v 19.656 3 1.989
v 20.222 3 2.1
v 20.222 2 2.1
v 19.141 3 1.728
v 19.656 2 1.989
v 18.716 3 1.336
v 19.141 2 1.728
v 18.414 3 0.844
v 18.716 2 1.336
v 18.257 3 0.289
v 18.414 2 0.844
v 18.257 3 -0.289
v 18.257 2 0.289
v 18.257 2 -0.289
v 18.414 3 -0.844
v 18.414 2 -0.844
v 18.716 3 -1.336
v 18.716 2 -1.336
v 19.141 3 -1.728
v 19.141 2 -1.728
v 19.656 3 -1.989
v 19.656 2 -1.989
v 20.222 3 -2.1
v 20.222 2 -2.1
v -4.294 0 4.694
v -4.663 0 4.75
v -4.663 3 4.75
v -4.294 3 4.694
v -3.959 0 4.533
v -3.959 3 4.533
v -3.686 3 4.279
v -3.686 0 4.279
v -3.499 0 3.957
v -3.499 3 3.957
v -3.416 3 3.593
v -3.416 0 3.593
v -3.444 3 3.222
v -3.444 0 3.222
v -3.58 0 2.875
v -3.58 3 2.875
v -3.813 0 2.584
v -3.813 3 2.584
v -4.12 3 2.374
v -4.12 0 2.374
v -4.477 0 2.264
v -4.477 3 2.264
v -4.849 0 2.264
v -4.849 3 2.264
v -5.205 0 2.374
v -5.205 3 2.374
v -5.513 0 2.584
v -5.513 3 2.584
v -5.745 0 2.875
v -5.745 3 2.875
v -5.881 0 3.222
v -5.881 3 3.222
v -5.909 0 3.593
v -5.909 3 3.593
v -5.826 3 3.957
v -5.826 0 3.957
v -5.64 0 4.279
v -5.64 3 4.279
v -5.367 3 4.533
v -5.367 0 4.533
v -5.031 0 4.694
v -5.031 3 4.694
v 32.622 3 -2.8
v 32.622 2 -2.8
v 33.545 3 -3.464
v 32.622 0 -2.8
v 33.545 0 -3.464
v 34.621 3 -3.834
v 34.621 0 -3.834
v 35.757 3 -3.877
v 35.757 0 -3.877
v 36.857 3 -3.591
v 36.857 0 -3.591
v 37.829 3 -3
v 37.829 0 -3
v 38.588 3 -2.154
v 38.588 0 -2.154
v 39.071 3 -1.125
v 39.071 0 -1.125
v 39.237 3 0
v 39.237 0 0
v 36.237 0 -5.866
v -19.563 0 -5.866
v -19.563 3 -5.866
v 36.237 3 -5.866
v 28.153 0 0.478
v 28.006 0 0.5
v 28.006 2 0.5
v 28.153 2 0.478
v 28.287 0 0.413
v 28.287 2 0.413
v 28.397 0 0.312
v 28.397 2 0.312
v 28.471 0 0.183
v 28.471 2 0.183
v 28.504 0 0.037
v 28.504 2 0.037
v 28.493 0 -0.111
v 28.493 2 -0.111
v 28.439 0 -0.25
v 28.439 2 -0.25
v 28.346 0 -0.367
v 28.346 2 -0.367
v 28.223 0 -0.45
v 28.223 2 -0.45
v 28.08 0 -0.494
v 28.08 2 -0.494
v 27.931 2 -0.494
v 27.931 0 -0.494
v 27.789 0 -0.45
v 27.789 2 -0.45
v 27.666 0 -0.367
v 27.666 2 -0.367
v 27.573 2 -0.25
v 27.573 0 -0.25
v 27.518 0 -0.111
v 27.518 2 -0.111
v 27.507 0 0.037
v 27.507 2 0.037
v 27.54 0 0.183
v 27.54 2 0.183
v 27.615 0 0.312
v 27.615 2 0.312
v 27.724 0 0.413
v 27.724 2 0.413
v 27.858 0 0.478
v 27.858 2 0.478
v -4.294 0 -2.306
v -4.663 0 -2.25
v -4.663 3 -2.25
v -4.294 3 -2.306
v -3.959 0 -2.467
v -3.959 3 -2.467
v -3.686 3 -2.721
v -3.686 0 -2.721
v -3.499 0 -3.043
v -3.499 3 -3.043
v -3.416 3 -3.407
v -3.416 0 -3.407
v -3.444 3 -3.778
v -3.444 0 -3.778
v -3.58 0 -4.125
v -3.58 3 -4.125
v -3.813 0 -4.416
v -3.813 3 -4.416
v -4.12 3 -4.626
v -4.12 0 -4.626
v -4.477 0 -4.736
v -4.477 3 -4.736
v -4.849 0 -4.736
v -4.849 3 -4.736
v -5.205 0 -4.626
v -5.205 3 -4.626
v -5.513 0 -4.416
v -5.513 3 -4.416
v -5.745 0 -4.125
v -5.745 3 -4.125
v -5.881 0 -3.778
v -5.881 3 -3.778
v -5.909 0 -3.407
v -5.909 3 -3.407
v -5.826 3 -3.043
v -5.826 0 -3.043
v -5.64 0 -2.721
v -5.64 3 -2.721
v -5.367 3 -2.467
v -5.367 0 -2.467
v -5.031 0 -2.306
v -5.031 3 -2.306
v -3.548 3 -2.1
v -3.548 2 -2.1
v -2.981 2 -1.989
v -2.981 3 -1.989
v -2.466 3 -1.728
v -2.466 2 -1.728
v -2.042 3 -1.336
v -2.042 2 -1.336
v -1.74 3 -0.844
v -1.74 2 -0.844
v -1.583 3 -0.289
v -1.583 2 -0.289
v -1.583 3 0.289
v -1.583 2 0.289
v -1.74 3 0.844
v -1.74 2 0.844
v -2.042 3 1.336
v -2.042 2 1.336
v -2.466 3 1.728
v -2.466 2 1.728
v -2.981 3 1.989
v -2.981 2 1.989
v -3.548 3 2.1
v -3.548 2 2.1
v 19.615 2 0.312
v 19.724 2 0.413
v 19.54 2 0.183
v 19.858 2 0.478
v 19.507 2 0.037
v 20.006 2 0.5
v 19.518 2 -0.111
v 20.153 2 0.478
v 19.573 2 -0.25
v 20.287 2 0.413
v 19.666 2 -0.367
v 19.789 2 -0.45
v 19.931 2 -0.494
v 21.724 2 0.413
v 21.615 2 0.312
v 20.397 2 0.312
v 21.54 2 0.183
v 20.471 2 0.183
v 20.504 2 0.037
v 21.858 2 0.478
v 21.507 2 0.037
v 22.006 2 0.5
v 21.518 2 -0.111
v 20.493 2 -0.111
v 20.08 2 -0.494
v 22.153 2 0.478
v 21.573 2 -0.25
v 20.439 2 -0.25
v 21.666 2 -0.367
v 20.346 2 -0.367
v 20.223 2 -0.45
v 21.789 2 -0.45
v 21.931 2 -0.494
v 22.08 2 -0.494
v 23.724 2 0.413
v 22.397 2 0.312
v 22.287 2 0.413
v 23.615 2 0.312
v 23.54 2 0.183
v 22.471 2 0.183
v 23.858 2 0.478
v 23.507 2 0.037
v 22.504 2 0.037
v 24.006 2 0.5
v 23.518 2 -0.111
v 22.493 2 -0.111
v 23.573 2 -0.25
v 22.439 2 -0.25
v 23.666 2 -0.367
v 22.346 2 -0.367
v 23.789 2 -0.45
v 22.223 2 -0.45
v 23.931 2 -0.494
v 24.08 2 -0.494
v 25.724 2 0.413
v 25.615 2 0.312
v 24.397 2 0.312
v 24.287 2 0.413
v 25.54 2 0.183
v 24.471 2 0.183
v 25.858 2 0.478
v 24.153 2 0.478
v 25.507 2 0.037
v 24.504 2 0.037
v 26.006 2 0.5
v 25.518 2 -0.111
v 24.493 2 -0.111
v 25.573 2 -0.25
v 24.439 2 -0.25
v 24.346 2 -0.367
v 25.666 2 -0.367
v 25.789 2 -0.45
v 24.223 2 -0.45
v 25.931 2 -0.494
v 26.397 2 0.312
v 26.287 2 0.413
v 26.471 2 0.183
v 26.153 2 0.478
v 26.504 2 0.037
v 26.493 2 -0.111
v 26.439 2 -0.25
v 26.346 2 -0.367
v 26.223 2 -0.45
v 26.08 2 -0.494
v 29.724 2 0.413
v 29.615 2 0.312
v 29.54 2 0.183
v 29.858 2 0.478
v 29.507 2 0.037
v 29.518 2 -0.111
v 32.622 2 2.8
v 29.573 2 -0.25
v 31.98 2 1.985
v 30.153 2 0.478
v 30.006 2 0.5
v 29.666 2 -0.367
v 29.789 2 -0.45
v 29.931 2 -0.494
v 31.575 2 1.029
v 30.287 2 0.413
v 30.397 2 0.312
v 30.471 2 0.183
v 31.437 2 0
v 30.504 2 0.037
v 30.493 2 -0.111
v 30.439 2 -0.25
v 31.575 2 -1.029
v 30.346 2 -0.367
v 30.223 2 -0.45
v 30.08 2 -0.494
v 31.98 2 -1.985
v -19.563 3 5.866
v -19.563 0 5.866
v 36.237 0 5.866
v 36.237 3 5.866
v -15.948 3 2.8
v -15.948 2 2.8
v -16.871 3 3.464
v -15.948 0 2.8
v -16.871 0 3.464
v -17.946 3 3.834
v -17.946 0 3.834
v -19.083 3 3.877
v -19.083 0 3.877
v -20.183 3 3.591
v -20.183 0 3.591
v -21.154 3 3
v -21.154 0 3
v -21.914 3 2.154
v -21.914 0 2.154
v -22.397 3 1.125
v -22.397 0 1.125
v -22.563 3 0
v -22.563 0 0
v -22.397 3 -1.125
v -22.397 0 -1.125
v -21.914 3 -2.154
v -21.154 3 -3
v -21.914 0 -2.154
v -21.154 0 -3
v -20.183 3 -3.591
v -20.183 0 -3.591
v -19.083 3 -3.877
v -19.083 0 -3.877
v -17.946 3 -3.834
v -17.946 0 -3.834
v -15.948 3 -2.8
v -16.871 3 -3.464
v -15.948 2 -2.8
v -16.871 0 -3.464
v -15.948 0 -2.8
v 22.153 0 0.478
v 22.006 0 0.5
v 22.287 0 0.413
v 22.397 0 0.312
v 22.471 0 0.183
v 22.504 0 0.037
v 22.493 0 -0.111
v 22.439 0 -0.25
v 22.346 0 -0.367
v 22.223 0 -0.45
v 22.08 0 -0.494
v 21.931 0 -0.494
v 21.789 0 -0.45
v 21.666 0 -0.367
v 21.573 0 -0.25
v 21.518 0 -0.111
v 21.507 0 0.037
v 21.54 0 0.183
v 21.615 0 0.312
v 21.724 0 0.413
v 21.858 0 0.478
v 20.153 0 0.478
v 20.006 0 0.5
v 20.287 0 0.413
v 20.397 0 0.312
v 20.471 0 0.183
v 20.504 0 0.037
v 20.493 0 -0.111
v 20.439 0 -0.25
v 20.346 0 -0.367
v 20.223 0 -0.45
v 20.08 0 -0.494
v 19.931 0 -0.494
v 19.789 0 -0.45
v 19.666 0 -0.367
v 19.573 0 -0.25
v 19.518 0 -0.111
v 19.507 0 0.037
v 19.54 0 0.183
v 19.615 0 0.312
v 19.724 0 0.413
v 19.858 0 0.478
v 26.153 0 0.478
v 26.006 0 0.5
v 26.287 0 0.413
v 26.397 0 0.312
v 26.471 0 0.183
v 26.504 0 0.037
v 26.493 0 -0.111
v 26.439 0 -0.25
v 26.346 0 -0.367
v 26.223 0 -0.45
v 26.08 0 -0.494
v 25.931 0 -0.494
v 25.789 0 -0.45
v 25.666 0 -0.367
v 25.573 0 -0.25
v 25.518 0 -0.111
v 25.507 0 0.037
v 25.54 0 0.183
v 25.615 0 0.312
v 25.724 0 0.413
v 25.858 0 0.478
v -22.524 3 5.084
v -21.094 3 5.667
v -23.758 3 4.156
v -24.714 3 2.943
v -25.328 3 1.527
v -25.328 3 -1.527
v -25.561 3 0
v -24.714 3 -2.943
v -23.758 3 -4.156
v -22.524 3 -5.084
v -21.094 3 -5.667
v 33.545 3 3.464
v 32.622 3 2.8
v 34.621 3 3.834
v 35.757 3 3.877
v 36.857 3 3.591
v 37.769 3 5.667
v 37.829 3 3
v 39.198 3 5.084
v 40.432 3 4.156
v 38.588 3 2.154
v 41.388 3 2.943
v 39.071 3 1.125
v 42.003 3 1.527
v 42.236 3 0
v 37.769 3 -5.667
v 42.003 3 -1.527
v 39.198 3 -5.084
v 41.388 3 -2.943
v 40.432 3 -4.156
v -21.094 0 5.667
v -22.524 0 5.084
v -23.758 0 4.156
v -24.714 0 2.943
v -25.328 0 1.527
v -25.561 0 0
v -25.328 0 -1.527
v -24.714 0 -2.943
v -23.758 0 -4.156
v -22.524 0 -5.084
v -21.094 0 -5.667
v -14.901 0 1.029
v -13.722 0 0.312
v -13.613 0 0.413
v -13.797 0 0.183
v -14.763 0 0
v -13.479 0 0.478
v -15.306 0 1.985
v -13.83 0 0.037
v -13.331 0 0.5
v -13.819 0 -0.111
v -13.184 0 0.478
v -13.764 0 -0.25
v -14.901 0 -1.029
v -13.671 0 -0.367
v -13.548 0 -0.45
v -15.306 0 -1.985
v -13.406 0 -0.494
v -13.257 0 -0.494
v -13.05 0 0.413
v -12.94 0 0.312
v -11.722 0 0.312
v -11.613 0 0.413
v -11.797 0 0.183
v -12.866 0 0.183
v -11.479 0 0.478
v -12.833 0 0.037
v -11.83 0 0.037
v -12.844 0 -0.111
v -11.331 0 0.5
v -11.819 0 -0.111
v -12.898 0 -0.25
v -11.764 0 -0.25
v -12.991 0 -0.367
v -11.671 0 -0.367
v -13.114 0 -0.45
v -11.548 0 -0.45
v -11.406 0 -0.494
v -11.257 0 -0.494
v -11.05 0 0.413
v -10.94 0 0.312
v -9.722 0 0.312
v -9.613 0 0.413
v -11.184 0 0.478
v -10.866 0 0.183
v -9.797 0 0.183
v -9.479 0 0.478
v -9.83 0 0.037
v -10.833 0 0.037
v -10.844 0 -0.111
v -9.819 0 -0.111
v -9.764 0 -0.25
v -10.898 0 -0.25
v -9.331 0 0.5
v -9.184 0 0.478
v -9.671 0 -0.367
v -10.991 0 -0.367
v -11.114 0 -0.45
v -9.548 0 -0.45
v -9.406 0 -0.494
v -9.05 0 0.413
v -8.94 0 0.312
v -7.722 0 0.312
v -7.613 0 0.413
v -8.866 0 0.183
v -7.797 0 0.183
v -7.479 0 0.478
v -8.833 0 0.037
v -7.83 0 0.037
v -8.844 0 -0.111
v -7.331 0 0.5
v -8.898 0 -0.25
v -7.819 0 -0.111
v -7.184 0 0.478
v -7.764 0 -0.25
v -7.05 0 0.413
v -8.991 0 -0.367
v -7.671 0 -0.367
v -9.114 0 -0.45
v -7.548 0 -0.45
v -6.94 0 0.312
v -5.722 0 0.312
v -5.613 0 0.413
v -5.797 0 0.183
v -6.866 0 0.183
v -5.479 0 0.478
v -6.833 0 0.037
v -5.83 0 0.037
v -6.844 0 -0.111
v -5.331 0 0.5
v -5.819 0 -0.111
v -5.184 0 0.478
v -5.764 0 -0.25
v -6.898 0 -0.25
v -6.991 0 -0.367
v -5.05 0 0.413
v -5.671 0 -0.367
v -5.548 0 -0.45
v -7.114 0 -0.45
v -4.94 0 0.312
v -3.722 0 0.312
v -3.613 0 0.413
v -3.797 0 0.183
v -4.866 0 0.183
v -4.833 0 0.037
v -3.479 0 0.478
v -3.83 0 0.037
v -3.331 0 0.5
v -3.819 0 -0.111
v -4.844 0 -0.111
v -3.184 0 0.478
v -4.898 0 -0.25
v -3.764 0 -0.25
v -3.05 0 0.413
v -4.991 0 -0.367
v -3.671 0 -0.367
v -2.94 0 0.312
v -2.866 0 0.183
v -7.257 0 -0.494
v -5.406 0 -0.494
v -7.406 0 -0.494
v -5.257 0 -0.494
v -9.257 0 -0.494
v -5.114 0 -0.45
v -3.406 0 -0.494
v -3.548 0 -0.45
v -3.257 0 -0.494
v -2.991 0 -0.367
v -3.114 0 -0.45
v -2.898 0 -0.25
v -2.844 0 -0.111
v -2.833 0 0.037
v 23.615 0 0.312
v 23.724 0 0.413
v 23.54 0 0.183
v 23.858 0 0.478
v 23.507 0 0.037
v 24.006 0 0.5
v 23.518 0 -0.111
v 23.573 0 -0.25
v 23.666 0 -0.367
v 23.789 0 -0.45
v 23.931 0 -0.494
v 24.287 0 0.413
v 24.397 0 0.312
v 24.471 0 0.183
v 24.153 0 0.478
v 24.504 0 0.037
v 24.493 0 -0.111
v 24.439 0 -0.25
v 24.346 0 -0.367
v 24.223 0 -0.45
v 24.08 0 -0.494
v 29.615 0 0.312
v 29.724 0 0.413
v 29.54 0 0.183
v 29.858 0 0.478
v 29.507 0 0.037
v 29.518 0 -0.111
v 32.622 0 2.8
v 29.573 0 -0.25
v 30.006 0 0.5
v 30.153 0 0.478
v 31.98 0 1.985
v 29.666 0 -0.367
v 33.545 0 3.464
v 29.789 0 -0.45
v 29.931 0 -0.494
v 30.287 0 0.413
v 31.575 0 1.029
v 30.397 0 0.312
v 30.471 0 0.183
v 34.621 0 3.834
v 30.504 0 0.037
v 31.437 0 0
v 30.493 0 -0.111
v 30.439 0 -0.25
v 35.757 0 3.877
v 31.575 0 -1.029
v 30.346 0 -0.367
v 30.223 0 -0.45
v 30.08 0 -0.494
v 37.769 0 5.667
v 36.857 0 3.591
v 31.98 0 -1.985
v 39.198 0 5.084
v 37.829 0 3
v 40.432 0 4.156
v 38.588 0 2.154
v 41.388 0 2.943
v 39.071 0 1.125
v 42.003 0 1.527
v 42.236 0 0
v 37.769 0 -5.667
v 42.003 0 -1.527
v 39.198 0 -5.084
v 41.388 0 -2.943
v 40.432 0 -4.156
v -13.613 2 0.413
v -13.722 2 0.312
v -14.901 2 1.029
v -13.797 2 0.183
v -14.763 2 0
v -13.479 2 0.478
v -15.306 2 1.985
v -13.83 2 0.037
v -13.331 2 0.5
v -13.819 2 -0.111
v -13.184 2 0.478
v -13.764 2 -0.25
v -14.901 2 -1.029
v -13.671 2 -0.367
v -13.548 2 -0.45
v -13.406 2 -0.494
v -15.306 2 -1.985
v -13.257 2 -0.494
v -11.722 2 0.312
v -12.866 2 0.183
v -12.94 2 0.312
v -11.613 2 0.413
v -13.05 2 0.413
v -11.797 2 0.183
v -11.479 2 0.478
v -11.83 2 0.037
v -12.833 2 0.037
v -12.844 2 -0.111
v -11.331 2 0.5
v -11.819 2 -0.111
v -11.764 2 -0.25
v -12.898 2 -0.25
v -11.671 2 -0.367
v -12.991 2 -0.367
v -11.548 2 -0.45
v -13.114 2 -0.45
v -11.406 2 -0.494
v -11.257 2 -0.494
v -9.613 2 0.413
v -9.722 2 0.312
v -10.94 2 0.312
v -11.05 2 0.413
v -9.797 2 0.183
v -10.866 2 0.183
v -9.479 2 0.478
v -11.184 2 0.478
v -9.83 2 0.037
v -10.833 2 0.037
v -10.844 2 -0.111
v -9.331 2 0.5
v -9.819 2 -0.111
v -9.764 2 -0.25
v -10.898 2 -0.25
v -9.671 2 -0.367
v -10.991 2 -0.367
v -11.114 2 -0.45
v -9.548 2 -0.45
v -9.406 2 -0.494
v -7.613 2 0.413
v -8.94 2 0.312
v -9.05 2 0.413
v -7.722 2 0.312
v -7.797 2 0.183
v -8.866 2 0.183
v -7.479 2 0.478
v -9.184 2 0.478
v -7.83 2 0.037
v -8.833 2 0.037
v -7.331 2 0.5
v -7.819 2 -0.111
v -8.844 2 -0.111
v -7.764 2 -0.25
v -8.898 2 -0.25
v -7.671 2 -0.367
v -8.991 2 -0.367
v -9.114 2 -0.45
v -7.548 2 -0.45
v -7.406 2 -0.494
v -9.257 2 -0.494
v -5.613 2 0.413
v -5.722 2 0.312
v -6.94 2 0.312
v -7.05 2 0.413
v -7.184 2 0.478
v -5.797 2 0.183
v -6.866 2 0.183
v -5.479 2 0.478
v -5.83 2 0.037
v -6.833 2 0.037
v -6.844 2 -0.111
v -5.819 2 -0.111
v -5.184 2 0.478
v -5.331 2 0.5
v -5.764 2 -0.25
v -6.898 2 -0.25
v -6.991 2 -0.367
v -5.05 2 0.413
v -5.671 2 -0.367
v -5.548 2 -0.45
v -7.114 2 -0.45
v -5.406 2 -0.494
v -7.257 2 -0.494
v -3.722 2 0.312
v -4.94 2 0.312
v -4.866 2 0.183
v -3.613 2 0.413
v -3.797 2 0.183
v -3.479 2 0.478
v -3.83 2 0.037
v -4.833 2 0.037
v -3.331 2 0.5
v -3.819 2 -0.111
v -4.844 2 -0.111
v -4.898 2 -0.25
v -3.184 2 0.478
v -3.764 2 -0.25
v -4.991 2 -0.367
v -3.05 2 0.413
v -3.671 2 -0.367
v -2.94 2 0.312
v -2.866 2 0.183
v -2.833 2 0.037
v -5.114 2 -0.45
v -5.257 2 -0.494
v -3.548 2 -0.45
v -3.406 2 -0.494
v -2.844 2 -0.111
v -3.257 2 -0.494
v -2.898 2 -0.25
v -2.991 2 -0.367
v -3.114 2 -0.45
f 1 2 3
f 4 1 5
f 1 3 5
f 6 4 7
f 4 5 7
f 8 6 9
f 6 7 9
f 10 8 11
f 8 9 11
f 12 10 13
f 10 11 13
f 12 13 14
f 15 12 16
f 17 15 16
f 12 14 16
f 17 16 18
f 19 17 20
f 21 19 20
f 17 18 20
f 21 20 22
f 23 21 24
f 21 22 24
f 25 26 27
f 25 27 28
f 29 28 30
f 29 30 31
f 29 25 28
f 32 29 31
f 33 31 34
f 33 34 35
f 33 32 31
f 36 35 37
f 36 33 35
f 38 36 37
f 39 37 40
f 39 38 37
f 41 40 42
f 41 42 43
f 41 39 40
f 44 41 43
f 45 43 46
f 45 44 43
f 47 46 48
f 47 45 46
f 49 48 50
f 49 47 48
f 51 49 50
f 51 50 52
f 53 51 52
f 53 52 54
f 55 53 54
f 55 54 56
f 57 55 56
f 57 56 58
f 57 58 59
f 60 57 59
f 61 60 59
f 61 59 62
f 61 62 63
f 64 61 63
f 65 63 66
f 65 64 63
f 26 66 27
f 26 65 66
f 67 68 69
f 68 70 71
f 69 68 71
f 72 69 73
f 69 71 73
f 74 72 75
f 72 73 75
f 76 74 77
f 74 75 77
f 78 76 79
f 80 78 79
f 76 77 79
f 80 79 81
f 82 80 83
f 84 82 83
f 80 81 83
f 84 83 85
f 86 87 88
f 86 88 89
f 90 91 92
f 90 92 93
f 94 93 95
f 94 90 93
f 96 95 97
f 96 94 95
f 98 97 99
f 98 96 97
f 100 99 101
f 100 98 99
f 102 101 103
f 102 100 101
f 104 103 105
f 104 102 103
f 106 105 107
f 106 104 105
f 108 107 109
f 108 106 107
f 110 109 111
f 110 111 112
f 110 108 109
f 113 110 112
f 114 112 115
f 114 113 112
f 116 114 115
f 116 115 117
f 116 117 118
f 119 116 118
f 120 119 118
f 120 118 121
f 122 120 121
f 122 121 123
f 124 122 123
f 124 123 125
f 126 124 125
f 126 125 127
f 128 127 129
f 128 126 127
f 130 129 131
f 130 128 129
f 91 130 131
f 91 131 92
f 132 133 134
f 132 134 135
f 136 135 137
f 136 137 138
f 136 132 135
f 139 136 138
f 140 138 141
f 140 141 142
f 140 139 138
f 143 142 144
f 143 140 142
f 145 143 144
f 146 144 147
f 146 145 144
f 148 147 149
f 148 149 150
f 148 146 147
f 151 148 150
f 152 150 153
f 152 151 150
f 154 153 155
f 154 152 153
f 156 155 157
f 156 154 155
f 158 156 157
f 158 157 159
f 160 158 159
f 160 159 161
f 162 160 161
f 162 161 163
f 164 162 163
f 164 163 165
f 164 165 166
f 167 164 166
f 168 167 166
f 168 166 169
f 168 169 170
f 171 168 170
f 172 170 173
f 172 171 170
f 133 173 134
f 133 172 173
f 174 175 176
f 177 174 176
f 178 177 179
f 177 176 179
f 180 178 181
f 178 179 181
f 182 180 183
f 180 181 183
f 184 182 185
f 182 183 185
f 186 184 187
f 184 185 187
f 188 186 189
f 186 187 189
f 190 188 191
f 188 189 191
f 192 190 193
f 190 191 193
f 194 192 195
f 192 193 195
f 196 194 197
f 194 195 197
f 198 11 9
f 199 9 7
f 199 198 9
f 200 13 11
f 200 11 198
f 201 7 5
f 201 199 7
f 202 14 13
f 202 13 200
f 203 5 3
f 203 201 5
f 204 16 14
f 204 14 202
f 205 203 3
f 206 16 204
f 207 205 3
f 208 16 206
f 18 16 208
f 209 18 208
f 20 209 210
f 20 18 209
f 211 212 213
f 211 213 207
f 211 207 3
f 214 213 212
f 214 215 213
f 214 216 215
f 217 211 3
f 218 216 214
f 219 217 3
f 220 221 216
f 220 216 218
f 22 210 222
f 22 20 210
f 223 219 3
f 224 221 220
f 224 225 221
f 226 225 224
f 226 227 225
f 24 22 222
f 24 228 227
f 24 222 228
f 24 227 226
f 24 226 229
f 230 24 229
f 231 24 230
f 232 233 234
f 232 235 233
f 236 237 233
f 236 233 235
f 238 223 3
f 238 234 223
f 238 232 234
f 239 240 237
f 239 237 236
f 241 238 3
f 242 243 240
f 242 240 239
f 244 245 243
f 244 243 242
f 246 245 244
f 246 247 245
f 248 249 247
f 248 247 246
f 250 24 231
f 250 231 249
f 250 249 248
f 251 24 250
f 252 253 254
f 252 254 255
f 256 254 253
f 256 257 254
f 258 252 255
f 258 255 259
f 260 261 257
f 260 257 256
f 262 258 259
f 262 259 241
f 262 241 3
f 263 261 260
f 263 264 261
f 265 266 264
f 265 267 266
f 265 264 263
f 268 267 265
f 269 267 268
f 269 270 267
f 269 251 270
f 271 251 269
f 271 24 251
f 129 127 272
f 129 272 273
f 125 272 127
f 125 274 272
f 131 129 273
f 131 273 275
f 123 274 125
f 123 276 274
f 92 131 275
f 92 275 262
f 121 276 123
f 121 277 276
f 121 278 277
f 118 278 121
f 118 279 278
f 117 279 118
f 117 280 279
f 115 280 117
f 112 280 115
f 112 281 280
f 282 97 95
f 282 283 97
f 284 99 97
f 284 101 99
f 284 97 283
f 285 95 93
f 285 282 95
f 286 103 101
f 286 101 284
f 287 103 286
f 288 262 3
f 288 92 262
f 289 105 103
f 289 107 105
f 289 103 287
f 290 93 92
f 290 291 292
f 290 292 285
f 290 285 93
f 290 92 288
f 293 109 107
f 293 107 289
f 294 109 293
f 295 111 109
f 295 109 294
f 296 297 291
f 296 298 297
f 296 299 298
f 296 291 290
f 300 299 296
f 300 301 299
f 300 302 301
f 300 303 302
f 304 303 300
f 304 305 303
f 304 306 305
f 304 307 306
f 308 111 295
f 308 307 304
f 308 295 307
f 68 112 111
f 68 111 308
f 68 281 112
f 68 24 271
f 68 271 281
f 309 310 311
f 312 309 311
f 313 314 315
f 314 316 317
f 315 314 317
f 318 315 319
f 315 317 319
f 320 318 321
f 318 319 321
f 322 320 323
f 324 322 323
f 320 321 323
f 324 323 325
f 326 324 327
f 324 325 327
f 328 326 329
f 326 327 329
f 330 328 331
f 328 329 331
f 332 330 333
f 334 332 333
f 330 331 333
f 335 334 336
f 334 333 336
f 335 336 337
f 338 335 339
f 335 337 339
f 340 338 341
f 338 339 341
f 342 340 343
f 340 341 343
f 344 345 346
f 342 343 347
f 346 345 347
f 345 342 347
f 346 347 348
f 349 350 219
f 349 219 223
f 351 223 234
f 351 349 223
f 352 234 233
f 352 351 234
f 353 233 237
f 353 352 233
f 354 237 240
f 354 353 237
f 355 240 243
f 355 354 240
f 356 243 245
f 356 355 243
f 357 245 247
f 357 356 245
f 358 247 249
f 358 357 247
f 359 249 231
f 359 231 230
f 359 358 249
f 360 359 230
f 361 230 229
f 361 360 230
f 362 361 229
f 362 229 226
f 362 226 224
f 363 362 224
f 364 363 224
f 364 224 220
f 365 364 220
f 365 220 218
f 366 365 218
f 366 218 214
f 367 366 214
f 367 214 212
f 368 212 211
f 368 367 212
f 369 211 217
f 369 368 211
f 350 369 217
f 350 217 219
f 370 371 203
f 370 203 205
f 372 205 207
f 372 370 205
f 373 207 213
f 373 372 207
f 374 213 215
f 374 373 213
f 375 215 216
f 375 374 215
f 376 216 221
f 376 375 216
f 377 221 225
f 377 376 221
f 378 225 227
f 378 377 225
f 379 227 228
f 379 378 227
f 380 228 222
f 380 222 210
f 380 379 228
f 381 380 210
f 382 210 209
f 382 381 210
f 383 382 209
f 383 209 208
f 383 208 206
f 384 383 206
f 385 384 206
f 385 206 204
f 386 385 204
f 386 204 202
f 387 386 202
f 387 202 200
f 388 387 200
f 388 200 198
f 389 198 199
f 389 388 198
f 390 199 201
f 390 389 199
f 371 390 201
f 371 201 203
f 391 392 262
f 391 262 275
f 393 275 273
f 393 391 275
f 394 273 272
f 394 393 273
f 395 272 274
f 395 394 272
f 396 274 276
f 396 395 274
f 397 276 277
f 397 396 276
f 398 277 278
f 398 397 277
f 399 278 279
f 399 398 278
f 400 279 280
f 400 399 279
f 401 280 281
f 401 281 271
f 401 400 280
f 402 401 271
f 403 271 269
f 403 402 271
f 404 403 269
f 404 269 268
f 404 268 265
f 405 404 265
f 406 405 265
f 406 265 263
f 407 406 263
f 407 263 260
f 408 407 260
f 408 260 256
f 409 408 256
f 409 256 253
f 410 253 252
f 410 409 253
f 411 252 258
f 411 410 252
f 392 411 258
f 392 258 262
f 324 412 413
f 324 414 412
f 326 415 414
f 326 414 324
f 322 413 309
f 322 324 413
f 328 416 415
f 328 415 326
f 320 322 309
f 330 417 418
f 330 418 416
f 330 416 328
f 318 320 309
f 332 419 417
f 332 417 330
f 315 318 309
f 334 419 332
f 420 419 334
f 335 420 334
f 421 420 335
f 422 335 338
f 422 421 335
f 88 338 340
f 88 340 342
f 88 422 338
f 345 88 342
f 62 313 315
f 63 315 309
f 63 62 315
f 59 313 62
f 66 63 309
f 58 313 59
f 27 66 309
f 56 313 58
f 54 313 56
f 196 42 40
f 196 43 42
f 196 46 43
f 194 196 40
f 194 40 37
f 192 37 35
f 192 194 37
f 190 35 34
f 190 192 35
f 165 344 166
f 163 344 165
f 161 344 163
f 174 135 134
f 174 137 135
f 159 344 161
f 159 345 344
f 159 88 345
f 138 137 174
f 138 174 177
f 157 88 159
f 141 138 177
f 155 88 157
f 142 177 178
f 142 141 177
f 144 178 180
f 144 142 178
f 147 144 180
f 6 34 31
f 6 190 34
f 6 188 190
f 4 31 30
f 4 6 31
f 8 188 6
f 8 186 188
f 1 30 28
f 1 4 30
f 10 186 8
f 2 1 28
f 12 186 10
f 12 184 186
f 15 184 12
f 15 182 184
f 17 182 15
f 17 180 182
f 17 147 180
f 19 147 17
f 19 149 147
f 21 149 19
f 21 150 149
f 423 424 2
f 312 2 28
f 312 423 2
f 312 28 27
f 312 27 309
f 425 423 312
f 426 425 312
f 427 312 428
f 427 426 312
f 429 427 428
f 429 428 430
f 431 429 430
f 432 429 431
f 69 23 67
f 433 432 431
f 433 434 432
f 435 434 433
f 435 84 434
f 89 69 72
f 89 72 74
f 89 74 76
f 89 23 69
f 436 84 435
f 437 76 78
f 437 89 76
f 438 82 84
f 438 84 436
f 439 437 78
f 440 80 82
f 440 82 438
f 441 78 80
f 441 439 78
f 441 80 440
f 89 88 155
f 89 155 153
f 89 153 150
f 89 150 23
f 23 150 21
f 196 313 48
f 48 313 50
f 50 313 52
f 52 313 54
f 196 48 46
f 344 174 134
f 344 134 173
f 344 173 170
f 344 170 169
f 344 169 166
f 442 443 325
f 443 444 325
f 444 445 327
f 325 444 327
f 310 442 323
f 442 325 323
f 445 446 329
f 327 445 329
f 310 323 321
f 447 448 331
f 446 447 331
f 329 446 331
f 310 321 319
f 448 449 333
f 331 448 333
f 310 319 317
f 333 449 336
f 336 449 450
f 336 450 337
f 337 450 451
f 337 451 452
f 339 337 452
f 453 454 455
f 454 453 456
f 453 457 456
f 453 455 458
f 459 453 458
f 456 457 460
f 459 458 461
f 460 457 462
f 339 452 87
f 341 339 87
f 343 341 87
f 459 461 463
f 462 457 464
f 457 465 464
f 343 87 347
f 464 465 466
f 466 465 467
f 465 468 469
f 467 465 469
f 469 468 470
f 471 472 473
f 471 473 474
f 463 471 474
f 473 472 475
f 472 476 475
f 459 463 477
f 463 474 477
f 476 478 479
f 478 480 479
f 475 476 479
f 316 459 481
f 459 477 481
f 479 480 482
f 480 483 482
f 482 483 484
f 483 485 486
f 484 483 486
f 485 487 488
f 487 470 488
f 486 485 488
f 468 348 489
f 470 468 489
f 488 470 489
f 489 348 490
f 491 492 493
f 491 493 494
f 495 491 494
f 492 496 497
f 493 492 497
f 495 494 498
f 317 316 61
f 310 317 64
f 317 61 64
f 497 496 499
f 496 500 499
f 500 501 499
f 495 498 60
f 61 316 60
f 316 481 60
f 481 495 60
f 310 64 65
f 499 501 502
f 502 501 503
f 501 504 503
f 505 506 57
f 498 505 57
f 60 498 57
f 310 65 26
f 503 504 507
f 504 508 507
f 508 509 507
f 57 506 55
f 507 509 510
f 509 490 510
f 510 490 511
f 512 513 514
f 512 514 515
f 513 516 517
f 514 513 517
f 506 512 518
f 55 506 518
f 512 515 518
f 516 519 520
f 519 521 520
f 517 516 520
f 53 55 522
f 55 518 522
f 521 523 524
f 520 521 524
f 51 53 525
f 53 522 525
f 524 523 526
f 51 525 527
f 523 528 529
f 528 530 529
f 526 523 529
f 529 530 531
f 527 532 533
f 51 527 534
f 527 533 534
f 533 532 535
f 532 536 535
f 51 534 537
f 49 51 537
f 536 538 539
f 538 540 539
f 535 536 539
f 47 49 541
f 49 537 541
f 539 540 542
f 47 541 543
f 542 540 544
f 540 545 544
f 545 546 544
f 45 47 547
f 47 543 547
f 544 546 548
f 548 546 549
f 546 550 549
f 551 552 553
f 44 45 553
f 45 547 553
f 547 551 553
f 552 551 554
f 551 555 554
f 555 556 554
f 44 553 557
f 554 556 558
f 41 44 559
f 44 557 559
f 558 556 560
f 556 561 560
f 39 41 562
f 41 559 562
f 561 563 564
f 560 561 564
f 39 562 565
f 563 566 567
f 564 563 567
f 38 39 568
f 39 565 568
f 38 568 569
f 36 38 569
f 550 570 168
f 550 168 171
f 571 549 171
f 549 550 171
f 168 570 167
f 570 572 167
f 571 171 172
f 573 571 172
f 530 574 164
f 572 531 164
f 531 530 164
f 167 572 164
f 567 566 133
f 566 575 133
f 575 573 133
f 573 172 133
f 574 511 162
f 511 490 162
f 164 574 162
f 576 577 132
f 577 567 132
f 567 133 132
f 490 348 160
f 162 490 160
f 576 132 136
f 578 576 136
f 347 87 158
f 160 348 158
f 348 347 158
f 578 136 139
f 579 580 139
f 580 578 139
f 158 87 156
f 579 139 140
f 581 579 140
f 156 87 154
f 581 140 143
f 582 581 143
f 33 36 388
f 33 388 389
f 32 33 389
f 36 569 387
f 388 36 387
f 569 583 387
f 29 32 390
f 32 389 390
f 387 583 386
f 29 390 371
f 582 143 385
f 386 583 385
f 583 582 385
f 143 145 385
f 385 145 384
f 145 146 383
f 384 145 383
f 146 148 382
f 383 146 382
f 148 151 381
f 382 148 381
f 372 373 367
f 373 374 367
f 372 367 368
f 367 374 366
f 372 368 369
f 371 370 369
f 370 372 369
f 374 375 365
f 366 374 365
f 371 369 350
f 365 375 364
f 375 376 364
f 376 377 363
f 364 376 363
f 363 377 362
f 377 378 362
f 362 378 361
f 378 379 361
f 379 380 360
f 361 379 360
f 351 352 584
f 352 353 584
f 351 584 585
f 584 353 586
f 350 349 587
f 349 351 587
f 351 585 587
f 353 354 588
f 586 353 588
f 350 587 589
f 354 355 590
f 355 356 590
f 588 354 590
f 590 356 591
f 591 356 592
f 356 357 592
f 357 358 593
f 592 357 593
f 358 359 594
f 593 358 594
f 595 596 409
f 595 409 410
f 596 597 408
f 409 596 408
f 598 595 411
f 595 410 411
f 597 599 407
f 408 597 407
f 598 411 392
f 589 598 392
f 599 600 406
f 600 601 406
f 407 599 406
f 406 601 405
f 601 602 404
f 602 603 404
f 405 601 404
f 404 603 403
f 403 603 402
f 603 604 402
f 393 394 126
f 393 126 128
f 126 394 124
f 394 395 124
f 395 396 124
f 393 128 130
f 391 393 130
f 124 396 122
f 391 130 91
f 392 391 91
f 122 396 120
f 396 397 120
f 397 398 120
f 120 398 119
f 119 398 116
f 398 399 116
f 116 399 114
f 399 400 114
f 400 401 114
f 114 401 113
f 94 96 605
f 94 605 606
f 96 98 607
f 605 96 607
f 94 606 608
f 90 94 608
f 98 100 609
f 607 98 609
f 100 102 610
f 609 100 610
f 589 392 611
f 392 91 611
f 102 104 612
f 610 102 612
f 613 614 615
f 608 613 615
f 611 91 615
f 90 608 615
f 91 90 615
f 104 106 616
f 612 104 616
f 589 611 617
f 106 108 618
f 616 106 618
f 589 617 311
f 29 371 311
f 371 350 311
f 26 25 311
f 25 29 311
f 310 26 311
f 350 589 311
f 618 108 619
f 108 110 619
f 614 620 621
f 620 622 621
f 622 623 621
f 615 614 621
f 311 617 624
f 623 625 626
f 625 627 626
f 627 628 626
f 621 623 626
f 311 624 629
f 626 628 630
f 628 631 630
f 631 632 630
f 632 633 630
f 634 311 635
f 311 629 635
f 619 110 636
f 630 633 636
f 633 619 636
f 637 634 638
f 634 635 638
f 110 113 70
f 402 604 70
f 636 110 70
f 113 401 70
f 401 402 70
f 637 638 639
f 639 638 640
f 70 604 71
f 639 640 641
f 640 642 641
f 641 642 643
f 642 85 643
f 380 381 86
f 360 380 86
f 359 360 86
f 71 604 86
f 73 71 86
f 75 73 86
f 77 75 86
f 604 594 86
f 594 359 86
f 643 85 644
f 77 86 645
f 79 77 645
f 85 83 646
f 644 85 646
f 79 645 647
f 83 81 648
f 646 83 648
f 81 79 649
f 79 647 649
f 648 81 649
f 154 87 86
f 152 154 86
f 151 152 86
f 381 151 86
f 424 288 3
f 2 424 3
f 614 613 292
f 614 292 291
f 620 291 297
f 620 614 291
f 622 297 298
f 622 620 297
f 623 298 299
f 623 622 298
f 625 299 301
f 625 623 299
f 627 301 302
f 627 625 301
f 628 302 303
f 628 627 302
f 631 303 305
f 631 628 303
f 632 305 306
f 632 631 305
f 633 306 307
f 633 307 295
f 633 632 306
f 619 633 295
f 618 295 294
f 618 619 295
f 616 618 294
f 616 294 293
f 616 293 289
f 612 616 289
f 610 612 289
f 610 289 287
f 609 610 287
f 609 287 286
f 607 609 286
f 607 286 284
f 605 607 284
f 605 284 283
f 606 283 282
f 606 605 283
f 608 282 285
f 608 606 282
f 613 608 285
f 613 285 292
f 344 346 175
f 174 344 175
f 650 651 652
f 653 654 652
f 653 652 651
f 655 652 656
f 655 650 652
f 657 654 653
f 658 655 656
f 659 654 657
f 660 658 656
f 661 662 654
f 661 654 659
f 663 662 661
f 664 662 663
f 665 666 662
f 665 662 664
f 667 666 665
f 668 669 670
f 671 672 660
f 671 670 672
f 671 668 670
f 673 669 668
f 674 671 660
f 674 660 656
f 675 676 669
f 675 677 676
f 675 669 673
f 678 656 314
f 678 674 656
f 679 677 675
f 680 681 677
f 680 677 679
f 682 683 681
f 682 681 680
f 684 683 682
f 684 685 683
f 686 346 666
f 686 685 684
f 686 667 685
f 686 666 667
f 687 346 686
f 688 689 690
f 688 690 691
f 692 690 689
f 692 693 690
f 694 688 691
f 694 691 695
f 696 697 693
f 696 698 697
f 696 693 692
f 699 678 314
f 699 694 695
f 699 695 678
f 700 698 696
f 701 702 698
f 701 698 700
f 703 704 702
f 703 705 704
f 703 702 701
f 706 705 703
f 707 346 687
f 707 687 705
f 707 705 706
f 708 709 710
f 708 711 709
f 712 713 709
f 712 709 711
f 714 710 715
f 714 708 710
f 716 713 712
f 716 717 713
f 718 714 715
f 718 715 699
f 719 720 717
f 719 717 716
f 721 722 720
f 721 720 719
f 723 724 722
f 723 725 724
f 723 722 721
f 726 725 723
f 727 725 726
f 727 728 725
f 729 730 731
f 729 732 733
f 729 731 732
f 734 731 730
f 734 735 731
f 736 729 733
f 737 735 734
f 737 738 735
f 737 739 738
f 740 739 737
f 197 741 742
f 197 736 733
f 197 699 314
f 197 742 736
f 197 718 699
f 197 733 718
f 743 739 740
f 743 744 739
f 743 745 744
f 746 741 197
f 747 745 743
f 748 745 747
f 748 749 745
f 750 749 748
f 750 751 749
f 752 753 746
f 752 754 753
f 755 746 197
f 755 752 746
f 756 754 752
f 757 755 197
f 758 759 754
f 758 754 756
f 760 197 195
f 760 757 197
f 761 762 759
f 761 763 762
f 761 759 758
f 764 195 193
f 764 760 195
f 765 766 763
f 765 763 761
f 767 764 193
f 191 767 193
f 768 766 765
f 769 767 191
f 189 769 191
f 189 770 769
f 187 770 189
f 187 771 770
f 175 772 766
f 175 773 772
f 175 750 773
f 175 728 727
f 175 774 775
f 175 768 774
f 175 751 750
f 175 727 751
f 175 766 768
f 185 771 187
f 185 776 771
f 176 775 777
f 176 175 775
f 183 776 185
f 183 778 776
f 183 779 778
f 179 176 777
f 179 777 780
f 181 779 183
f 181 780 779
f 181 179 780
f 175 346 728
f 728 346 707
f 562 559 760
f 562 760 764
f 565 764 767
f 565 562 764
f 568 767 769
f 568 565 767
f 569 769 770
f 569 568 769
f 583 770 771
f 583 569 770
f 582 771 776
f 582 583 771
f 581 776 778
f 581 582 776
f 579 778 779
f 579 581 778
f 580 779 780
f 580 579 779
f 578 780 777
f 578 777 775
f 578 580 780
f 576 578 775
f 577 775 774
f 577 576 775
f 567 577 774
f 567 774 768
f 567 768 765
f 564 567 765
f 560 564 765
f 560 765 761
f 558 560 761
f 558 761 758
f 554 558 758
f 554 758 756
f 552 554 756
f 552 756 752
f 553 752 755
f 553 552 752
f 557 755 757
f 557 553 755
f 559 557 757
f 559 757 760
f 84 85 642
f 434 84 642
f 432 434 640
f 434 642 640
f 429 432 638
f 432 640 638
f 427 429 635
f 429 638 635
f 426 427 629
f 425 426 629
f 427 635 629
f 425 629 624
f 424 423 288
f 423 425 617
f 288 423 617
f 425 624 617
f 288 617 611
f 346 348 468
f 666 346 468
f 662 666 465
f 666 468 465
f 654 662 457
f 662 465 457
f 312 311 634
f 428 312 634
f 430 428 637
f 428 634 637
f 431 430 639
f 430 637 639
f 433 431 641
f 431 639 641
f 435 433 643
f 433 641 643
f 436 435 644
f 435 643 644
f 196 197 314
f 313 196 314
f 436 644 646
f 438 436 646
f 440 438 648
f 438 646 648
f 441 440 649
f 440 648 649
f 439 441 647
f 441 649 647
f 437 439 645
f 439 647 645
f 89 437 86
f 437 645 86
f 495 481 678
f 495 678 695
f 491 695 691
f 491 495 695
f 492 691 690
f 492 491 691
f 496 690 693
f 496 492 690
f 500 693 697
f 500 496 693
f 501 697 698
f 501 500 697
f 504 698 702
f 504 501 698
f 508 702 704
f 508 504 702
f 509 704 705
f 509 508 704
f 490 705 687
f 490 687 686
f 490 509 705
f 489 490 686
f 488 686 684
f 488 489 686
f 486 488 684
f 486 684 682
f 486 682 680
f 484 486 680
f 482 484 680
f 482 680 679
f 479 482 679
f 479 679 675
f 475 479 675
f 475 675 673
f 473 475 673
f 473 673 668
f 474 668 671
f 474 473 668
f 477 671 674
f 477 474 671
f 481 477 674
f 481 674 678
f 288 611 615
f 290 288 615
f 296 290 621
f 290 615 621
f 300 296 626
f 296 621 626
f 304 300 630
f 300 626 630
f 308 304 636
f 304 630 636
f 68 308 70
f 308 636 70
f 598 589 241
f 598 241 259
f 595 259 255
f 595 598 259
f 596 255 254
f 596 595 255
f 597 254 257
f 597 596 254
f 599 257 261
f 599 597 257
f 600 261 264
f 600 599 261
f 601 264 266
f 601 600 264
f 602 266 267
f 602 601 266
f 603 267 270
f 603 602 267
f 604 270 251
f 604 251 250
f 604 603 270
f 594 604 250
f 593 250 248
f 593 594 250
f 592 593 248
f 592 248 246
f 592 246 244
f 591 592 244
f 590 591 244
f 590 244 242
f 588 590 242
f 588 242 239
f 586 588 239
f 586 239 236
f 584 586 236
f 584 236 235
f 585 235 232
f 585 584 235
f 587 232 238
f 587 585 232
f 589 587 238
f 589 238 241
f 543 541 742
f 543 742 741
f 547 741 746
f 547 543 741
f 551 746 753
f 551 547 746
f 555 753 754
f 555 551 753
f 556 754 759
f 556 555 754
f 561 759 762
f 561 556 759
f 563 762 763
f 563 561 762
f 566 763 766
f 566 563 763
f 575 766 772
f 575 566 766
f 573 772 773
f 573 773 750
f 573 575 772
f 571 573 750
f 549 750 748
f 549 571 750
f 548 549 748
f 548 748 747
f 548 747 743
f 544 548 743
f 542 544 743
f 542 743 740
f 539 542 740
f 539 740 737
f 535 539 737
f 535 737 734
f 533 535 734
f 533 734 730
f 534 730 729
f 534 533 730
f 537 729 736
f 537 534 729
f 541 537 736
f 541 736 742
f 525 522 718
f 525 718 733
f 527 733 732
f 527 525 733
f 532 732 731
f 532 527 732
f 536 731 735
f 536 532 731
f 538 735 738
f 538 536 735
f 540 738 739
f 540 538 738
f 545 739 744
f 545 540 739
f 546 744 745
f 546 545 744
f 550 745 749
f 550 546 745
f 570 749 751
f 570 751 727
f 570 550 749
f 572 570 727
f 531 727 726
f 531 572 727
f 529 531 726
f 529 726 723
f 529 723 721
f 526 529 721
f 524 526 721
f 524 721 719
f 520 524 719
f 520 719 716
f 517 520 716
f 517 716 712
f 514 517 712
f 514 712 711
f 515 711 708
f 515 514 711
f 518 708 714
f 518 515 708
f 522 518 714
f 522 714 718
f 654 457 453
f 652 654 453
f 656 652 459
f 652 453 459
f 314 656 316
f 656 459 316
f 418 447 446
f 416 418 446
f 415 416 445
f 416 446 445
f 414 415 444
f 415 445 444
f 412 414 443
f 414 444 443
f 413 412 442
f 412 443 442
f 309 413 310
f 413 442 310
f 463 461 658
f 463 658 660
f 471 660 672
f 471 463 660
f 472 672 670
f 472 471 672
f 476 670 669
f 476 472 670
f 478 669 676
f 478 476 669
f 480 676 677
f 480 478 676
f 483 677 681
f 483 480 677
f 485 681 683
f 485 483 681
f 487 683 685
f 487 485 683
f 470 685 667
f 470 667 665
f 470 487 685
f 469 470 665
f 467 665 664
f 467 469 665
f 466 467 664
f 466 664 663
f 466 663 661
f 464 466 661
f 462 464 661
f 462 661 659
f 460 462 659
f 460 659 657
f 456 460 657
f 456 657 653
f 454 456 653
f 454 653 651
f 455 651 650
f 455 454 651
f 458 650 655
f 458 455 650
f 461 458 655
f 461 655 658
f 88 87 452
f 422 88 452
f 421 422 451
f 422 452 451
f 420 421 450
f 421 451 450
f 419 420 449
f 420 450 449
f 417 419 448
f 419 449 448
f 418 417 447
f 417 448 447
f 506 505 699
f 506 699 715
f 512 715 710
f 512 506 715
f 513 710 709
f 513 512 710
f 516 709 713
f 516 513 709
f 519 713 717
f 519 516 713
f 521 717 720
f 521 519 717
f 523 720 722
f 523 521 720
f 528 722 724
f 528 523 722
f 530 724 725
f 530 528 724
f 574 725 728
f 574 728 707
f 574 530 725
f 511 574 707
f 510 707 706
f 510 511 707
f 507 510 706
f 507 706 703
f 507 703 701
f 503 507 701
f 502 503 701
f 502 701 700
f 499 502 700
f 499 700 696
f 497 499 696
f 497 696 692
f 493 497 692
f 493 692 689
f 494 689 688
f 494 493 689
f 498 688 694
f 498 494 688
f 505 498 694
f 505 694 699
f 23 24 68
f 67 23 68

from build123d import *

# Parameters (mm, degrees)
SKETCH1_W           = 67.8
SKETCH1_H           = 11.732307158
SKETCH1_R           = 1.25
BOSS_EXTRUDE1_DEPTH = 3
SKETCH1_7_R         = 0.5
BOSS_EXTRUDE2_DEPTH = 2
FILLET1_R           = 6


with BuildPart() as part:
    # Sketch1 → Boss-Extrude1 (new body)
    with BuildSketch(Plane(origin=(0, 0, 0), x_dir=(1, 0, 0), z_dir=(0, 1, 0))):
        with Locations((8.337190195, 0)):
            Rectangle(SKETCH1_W, SKETCH1_H)
        with Locations(Location((-4.662809805, -3.5, 0), (0, 0, 270))):
            Circle(SKETCH1_R, mode=Mode.SUBTRACT)
        with BuildLine():
            ThreePointArc((-15.948035413, -2.8), (-22.562809805, 0), (-15.948035413, 2.8))
            Line((-15.948035413, 2.8), (-3.54760873, 2.1))
            ThreePointArc((-3.54760873, 2.1), (-1.562809805, 0), (-3.54760873, -2.1))
            Line((-3.54760873, -2.1), (-15.948035413, -2.8))
        make_face(mode=Mode.SUBTRACT)
        with Locations(Location((-4.662809805, 3.5, 0), (0, 0, 270))):
            Circle(SKETCH1_R, mode=Mode.SUBTRACT)
        with BuildLine():
            Line((32.622415803, -2.8), (20.221989119, -2.1))
            ThreePointArc((20.221989119, -2.1), (18.237190195, 0), (20.221989119, 2.1))
            Line((20.221989119, 2.1), (32.622415803, 2.8))
            ThreePointArc((32.622415803, 2.8), (36.85745002, 3.591491343), (39.237190195, 0))
            ThreePointArc((39.237190195, 0), (36.85745002, -3.591491343), (32.622415803, -2.8))
        make_face(mode=Mode.SUBTRACT)
    extrude(amount=BOSS_EXTRUDE1_DEPTH)

    # Sketch1<7> → Boss-Extrude2 (add)
    # profile 1 of 2: a face of its own
    with BuildSketch(Plane(origin=(0, 0, 0), x_dir=(1, 0, 0), z_dir=(0, 1, 0))):
        with BuildLine():
            Line((-3.54760873, 2.1), (-15.948035413, 2.8))
            ThreePointArc((-15.948035413, 2.8), (-15.071318463, 1.520259825), (-14.762809805, 0))
            ThreePointArc((-14.762809805, 0), (-15.071318463, -1.520259825), (-15.948035413, -2.8))
            Line((-15.948035413, -2.8), (-3.54760873, -2.1))
            ThreePointArc((-3.54760873, -2.1), (-1.562809805, 0), (-3.54760873, 2.1))
        make_face()
        with Locations(Location((-13.331400804, 0, 0), (0, 0, 270))):
            Circle(SKETCH1_7_R, mode=Mode.SUBTRACT)
        with Locations(Location((-11.331400804, 0, 0), (0, 0, 270))):
            Circle(SKETCH1_7_R, mode=Mode.SUBTRACT)
        with Locations(Location((-9.331400804, 0, 0), (0, 0, 270))):
            Circle(SKETCH1_7_R, mode=Mode.SUBTRACT)
        with Locations(Location((-7.331400804, 0, 0), (0, 0, 270))):
            Circle(SKETCH1_7_R, mode=Mode.SUBTRACT)
        with Locations(Location((-5.331400804, 0, 0), (0, 0, 270))):
            Circle(SKETCH1_7_R, mode=Mode.SUBTRACT)
        with Locations(Location((-3.331400804, 0, 0), (0, 0, 270))):
            Circle(SKETCH1_7_R, mode=Mode.SUBTRACT)
    # profile 2 of 2: a face of its own
    with BuildSketch(Plane(origin=(0, 0, 0), x_dir=(1, 0, 0), z_dir=(0, 1, 0))):
        with BuildLine():
            ThreePointArc((20.221989119, 2.1), (18.237190195, 0), (20.221989119, -2.1))
            Line((20.221989119, -2.1), (32.622415803, -2.8))
            ThreePointArc((32.622415803, -2.8), (31.437190195, 0), (32.622415803, 2.8))
            Line((32.622415803, 2.8), (20.221989119, 2.1))
        make_face()
        with Locations(Location((22.005781193, 0, 0), (0, 0, 270))):
            Circle(SKETCH1_7_R, mode=Mode.SUBTRACT)
        with Locations(Location((24.005781193, 0, 0), (0, 0, 270))):
            Circle(SKETCH1_7_R, mode=Mode.SUBTRACT)
        with Locations(Location((26.005781193, 0, 0), (0, 0, 270))):
            Circle(SKETCH1_7_R, mode=Mode.SUBTRACT)
        with Locations(Location((28.005781193, 0, 0), (0, 0, 270))):
            Circle(SKETCH1_7_R, mode=Mode.SUBTRACT)
        with Locations(Location((30.005781193, 0, 0), (0, 0, 270))):
            Circle(SKETCH1_7_R, mode=Mode.SUBTRACT)
        with Locations(Location((20.005781193, 0, 0), (0, 0, 270))):
            Circle(SKETCH1_7_R, mode=Mode.SUBTRACT)
    extrude(amount=BOSS_EXTRUDE2_DEPTH)

    # Fillet1
    # the kernel refuses this fillet: 6 mm, written as the material it takes off along each edge
    with BuildSketch(Plane(origin=(-25.562809805, -15, 5.866153579), x_dir=(1, 0, 0), z_dir=(0, 1, 0)), Plane(origin=(42.237190195, -15, -5.866153579), x_dir=(-1, 0, 0), z_dir=(0, 1, 0))) as fillet1_piece_1:
        with BuildLine():
            CenterArc((FILLET1_R, FILLET1_R), FILLET1_R, 180, 90)
            Line((0, FILLET1_R), (0, 0))
            Line((0, 0), (FILLET1_R, 0))
        make_face()
    extrude(amount=33, mode=Mode.SUBTRACT)
    with BuildSketch(Plane(origin=(-25.562809805, -15, -5.866153579), x_dir=(1, 0, 0), z_dir=(0, 1, 0)), Plane(origin=(42.237190195, -15, 5.866153579), x_dir=(-1, 0, 0), z_dir=(0, 1, 0))) as fillet1_piece_2:
        with BuildLine():
            CenterArc((FILLET1_R, -FILLET1_R), FILLET1_R, 90, 90)
            Line((0, -FILLET1_R), (0, 0))
            Line((0, 0), (FILLET1_R, 0))
        make_face()
    extrude(amount=33, mode=Mode.SUBTRACT)


solid = part.part
